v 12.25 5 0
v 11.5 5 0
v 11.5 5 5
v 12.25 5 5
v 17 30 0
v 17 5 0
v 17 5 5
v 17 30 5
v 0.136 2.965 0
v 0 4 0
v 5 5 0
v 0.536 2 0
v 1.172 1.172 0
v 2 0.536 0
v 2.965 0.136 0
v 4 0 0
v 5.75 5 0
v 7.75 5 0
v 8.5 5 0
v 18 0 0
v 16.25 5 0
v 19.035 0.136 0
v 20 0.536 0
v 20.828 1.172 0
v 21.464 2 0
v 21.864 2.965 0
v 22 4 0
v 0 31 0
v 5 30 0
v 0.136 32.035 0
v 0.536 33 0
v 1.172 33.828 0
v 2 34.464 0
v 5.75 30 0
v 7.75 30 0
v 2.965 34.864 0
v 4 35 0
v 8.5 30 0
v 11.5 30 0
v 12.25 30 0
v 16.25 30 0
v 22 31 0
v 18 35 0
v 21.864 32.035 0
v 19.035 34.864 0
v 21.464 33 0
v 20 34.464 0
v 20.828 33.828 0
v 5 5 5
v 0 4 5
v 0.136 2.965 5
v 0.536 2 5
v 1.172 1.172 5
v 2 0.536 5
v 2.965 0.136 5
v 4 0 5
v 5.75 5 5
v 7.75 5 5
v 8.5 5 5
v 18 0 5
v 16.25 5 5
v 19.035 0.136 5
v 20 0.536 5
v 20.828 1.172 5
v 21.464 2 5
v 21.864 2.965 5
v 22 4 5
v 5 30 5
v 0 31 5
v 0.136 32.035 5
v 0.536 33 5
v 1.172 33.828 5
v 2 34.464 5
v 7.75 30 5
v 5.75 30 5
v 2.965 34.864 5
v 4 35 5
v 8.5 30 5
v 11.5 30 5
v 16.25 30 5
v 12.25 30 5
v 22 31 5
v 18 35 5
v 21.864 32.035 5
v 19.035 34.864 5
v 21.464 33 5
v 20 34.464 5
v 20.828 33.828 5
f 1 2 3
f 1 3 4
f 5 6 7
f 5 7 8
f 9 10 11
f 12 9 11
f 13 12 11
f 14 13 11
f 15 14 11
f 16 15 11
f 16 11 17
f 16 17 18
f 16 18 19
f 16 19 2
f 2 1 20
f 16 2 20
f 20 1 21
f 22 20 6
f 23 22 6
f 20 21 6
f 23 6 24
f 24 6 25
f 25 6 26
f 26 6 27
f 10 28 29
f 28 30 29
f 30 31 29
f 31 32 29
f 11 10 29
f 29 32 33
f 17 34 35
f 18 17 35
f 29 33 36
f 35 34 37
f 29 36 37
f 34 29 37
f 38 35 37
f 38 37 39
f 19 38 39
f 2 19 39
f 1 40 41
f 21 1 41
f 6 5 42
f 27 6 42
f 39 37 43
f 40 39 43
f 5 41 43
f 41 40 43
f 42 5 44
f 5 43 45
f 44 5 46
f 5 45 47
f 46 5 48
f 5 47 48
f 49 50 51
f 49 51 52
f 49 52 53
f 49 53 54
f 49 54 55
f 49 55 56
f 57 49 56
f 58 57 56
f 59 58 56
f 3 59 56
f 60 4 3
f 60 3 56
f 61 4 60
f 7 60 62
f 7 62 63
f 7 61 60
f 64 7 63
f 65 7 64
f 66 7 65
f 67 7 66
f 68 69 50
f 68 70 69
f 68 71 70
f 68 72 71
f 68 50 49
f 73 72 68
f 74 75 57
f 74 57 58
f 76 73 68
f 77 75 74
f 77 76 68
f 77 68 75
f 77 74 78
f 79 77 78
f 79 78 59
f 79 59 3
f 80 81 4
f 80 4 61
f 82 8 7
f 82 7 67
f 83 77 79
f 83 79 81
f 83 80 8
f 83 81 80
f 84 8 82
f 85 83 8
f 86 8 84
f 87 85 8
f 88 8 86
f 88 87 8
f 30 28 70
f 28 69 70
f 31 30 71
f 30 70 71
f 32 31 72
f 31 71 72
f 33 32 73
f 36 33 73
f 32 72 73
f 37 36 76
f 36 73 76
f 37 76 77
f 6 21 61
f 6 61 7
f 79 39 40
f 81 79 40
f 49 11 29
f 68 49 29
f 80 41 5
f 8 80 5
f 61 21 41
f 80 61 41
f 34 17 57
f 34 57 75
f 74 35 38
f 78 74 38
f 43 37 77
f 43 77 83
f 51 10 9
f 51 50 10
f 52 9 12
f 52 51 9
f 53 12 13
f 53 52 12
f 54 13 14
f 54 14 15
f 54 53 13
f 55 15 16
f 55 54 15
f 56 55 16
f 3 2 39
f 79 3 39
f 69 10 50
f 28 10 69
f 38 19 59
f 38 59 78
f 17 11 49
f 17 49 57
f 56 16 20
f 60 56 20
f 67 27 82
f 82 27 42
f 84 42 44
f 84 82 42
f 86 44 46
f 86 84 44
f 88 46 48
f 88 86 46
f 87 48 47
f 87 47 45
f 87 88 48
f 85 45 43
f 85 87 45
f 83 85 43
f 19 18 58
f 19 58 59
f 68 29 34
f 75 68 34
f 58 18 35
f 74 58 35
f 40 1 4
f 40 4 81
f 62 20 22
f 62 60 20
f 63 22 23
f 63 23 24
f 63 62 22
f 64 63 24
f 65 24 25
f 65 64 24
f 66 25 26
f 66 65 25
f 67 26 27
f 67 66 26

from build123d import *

# Parameters (mm, degrees)
BOX002_W     = 0.75
BOX002_H     = 25
BOX002_DEPTH = 10
BOX003_W     = 0.75
BOX003_H     = 25
BOX003_DEPTH = 10
BOX004_W     = 0.75
BOX004_H     = 25
BOX004_DEPTH = 10
BOX001_W     = 0.75
BOX001_H     = 25
BOX001_DEPTH = 10
BOX_W        = 22
BOX_H        = 35
BOX_DEPTH    = 5
FILLET_R     = 4


with BuildPart() as cube002:
    # Box002 → Box002 (new body)
    with BuildSketch(Plane(origin=(11.5, 5, 0), x_dir=(1, 0, 0), z_dir=(0, 0, 1))):
        with Locations((0.375, 12.5)):
            Rectangle(BOX002_W, BOX002_H)
    extrude(amount=BOX002_DEPTH)


with BuildPart() as cube003:
    # Box003 → Box003 (new body)
    with BuildSketch(Plane(origin=(7.75, 5, 0), x_dir=(1, 0, 0), z_dir=(0, 0, 1))):
        with Locations((0.375, 12.5)):
            Rectangle(BOX003_W, BOX003_H)
    extrude(amount=BOX003_DEPTH)


with BuildPart() as cube004:
    # Box004 → Box004 (new body)
    with BuildSketch(Plane(origin=(16.25, 5, 0), x_dir=(1, 0, 0), z_dir=(0, 0, 1))):
        with Locations((0.375, 12.5)):
            Rectangle(BOX004_W, BOX004_H)
    extrude(amount=BOX004_DEPTH)


with BuildPart() as fusion:
    # Box001 → Box001 (new body)
    with BuildSketch(Plane(origin=(5, 5, 0), x_dir=(1, 0, 0), z_dir=(0, 0, 1))):
        with Locations((0.375, 12.5)):
            Rectangle(BOX001_W, BOX001_H)
    extrude(amount=BOX001_DEPTH)

    # Fusion: union Cube002, Cube003, Cube004
    add(cube002.part)
    add(cube003.part)
    add(cube004.part)


with BuildPart() as cut:
    # Box → Box (new body)
    with BuildSketch(Plane.XY):
        with Locations((11, 17.5)):
            Rectangle(BOX_W, BOX_H)
    extrude(amount=BOX_DEPTH)

    # Fillet
    fillet_edges = [cut.edges().sort_by_distance(p)[0] for p in [
        (0, 0, 2.5),
        (0, 35, 2.5),
        (22, 0, 2.5),
        (22, 35, 2.5),
    ]]
    fillet(fillet_edges, radius=FILLET_R)

    # Cut: cut Fusion
    add(fusion.part, mode=Mode.SUBTRACT)


solid = cut.part
